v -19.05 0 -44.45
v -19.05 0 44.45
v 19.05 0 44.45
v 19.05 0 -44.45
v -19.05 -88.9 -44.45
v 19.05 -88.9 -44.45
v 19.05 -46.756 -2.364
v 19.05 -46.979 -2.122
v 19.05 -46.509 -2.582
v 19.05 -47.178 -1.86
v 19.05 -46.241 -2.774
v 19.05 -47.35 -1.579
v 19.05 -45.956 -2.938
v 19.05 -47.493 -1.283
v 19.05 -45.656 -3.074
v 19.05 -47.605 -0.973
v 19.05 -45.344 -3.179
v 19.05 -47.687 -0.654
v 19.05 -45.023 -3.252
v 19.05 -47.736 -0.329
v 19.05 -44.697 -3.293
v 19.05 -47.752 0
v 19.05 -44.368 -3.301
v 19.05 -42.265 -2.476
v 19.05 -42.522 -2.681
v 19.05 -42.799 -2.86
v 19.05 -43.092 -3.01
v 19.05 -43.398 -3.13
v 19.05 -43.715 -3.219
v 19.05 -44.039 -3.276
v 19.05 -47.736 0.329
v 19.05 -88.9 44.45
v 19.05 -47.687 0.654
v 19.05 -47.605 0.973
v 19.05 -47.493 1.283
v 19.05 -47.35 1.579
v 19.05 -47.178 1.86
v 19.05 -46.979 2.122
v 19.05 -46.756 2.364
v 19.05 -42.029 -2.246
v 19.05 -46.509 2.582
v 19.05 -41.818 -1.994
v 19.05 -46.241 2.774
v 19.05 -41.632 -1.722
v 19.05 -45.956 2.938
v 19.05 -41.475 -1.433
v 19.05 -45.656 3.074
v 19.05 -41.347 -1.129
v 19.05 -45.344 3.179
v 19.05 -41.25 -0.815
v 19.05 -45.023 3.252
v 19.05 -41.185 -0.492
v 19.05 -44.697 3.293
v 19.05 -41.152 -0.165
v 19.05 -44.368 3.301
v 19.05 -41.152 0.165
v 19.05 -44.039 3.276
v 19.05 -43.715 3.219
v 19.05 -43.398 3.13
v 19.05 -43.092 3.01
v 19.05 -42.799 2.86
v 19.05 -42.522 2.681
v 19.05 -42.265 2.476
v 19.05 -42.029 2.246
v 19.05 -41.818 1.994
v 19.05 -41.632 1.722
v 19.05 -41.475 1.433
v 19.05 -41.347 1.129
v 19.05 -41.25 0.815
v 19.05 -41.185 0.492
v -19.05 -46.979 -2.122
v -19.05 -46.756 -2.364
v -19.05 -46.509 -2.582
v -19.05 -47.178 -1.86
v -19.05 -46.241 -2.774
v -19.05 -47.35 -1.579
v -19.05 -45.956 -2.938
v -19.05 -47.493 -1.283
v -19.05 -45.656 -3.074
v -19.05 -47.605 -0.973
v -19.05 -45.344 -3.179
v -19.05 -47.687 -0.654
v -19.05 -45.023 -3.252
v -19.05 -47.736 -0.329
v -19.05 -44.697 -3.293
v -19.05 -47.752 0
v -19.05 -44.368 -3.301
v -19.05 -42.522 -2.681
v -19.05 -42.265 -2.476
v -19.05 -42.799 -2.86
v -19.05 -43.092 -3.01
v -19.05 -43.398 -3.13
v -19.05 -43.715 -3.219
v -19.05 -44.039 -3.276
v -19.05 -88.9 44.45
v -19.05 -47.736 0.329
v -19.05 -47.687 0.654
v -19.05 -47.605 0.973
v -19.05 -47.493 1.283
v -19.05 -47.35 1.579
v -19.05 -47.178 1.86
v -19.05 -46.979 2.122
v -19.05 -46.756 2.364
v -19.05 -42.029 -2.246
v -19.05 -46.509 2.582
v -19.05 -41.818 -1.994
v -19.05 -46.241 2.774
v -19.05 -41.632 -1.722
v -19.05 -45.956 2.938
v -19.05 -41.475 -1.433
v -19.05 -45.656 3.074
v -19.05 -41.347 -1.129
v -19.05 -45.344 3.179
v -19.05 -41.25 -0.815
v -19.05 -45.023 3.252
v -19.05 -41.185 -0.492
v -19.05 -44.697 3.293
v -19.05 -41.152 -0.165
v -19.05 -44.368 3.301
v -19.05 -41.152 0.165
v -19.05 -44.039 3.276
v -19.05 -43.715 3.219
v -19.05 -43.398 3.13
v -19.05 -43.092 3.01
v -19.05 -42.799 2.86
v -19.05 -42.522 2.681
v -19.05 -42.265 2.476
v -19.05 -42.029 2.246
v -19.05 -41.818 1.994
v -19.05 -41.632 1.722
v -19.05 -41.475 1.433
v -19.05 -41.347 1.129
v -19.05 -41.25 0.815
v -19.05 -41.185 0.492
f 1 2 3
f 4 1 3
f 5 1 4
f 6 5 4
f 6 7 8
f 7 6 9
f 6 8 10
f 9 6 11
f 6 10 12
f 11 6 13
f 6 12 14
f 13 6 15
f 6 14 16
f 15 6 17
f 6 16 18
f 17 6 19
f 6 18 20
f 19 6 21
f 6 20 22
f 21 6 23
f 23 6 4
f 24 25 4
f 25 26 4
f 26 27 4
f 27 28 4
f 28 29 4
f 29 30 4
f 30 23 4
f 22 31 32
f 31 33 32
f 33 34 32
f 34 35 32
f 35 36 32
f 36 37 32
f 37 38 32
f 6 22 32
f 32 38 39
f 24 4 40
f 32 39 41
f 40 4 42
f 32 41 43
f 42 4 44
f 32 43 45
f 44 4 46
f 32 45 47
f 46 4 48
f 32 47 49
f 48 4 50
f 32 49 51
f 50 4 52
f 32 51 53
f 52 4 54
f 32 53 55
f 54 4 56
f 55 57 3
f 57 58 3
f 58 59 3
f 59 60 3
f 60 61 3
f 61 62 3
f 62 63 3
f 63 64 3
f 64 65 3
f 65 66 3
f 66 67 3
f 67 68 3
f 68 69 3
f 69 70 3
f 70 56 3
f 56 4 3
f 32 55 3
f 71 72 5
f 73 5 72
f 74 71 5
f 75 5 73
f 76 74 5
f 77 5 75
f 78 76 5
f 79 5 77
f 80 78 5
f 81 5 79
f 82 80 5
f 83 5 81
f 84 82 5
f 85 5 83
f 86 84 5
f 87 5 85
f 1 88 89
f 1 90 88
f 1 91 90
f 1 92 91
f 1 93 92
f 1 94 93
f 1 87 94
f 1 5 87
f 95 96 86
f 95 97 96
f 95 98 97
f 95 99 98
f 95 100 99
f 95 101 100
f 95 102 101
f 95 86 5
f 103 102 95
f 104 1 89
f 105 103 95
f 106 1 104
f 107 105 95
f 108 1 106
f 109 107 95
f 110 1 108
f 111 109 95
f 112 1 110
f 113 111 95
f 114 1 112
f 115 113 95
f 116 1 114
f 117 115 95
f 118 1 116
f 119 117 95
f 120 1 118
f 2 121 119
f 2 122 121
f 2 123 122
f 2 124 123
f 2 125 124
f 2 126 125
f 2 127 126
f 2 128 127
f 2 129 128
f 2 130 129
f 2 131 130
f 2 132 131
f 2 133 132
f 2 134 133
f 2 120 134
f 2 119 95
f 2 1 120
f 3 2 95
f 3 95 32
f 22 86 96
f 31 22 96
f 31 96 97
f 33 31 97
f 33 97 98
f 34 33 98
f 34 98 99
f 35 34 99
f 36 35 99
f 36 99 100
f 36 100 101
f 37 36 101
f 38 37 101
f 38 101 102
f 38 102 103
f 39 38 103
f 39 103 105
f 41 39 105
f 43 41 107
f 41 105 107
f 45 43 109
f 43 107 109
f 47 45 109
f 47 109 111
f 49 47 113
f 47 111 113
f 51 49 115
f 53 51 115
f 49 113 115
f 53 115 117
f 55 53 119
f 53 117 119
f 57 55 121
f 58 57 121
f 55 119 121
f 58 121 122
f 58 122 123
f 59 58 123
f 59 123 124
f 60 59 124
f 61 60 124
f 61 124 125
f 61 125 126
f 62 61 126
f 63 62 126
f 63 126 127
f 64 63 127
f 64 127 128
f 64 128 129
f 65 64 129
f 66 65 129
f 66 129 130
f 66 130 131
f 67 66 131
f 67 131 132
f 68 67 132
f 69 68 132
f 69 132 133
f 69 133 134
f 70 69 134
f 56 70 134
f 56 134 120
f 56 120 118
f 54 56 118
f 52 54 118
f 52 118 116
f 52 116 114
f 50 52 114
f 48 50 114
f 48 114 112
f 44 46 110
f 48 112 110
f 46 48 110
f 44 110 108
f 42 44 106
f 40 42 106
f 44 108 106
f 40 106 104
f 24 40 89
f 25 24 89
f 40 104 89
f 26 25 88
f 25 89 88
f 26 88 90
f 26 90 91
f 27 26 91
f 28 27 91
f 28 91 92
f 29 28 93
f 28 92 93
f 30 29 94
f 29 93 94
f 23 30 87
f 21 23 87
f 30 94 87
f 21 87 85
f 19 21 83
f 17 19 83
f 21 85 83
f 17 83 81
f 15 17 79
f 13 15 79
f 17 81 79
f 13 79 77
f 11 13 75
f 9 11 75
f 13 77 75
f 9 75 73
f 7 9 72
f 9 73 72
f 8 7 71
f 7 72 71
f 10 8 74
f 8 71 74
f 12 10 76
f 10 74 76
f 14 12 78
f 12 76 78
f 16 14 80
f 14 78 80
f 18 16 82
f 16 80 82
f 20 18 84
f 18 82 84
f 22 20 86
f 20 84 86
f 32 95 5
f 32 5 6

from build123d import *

# Parameters (mm, degrees)
F0_W     = 38.1
F0_H     = 88.9
F1_DEPTH = 88.9
F2_R     = 3.302
F3_DEPTH = 38.101


with BuildPart() as f1:
    # F0 (on Front) → F1 (new body)
    with BuildSketch(Plane.XZ):
        Rectangle(F0_W, F0_H)
    extrude(amount=F1_DEPTH)

    # F2 (on face) → F3 (cut, through all)
    with BuildSketch(Plane(origin=(-19.05, 0, 0), x_dir=(0, -1, 0), z_dir=(-1, 0, 0))):
        with Locations((44.45, 0)):
            Circle(F2_R)
    extrude(amount=-F3_DEPTH, mode=Mode.SUBTRACT)


solid = f1.part
